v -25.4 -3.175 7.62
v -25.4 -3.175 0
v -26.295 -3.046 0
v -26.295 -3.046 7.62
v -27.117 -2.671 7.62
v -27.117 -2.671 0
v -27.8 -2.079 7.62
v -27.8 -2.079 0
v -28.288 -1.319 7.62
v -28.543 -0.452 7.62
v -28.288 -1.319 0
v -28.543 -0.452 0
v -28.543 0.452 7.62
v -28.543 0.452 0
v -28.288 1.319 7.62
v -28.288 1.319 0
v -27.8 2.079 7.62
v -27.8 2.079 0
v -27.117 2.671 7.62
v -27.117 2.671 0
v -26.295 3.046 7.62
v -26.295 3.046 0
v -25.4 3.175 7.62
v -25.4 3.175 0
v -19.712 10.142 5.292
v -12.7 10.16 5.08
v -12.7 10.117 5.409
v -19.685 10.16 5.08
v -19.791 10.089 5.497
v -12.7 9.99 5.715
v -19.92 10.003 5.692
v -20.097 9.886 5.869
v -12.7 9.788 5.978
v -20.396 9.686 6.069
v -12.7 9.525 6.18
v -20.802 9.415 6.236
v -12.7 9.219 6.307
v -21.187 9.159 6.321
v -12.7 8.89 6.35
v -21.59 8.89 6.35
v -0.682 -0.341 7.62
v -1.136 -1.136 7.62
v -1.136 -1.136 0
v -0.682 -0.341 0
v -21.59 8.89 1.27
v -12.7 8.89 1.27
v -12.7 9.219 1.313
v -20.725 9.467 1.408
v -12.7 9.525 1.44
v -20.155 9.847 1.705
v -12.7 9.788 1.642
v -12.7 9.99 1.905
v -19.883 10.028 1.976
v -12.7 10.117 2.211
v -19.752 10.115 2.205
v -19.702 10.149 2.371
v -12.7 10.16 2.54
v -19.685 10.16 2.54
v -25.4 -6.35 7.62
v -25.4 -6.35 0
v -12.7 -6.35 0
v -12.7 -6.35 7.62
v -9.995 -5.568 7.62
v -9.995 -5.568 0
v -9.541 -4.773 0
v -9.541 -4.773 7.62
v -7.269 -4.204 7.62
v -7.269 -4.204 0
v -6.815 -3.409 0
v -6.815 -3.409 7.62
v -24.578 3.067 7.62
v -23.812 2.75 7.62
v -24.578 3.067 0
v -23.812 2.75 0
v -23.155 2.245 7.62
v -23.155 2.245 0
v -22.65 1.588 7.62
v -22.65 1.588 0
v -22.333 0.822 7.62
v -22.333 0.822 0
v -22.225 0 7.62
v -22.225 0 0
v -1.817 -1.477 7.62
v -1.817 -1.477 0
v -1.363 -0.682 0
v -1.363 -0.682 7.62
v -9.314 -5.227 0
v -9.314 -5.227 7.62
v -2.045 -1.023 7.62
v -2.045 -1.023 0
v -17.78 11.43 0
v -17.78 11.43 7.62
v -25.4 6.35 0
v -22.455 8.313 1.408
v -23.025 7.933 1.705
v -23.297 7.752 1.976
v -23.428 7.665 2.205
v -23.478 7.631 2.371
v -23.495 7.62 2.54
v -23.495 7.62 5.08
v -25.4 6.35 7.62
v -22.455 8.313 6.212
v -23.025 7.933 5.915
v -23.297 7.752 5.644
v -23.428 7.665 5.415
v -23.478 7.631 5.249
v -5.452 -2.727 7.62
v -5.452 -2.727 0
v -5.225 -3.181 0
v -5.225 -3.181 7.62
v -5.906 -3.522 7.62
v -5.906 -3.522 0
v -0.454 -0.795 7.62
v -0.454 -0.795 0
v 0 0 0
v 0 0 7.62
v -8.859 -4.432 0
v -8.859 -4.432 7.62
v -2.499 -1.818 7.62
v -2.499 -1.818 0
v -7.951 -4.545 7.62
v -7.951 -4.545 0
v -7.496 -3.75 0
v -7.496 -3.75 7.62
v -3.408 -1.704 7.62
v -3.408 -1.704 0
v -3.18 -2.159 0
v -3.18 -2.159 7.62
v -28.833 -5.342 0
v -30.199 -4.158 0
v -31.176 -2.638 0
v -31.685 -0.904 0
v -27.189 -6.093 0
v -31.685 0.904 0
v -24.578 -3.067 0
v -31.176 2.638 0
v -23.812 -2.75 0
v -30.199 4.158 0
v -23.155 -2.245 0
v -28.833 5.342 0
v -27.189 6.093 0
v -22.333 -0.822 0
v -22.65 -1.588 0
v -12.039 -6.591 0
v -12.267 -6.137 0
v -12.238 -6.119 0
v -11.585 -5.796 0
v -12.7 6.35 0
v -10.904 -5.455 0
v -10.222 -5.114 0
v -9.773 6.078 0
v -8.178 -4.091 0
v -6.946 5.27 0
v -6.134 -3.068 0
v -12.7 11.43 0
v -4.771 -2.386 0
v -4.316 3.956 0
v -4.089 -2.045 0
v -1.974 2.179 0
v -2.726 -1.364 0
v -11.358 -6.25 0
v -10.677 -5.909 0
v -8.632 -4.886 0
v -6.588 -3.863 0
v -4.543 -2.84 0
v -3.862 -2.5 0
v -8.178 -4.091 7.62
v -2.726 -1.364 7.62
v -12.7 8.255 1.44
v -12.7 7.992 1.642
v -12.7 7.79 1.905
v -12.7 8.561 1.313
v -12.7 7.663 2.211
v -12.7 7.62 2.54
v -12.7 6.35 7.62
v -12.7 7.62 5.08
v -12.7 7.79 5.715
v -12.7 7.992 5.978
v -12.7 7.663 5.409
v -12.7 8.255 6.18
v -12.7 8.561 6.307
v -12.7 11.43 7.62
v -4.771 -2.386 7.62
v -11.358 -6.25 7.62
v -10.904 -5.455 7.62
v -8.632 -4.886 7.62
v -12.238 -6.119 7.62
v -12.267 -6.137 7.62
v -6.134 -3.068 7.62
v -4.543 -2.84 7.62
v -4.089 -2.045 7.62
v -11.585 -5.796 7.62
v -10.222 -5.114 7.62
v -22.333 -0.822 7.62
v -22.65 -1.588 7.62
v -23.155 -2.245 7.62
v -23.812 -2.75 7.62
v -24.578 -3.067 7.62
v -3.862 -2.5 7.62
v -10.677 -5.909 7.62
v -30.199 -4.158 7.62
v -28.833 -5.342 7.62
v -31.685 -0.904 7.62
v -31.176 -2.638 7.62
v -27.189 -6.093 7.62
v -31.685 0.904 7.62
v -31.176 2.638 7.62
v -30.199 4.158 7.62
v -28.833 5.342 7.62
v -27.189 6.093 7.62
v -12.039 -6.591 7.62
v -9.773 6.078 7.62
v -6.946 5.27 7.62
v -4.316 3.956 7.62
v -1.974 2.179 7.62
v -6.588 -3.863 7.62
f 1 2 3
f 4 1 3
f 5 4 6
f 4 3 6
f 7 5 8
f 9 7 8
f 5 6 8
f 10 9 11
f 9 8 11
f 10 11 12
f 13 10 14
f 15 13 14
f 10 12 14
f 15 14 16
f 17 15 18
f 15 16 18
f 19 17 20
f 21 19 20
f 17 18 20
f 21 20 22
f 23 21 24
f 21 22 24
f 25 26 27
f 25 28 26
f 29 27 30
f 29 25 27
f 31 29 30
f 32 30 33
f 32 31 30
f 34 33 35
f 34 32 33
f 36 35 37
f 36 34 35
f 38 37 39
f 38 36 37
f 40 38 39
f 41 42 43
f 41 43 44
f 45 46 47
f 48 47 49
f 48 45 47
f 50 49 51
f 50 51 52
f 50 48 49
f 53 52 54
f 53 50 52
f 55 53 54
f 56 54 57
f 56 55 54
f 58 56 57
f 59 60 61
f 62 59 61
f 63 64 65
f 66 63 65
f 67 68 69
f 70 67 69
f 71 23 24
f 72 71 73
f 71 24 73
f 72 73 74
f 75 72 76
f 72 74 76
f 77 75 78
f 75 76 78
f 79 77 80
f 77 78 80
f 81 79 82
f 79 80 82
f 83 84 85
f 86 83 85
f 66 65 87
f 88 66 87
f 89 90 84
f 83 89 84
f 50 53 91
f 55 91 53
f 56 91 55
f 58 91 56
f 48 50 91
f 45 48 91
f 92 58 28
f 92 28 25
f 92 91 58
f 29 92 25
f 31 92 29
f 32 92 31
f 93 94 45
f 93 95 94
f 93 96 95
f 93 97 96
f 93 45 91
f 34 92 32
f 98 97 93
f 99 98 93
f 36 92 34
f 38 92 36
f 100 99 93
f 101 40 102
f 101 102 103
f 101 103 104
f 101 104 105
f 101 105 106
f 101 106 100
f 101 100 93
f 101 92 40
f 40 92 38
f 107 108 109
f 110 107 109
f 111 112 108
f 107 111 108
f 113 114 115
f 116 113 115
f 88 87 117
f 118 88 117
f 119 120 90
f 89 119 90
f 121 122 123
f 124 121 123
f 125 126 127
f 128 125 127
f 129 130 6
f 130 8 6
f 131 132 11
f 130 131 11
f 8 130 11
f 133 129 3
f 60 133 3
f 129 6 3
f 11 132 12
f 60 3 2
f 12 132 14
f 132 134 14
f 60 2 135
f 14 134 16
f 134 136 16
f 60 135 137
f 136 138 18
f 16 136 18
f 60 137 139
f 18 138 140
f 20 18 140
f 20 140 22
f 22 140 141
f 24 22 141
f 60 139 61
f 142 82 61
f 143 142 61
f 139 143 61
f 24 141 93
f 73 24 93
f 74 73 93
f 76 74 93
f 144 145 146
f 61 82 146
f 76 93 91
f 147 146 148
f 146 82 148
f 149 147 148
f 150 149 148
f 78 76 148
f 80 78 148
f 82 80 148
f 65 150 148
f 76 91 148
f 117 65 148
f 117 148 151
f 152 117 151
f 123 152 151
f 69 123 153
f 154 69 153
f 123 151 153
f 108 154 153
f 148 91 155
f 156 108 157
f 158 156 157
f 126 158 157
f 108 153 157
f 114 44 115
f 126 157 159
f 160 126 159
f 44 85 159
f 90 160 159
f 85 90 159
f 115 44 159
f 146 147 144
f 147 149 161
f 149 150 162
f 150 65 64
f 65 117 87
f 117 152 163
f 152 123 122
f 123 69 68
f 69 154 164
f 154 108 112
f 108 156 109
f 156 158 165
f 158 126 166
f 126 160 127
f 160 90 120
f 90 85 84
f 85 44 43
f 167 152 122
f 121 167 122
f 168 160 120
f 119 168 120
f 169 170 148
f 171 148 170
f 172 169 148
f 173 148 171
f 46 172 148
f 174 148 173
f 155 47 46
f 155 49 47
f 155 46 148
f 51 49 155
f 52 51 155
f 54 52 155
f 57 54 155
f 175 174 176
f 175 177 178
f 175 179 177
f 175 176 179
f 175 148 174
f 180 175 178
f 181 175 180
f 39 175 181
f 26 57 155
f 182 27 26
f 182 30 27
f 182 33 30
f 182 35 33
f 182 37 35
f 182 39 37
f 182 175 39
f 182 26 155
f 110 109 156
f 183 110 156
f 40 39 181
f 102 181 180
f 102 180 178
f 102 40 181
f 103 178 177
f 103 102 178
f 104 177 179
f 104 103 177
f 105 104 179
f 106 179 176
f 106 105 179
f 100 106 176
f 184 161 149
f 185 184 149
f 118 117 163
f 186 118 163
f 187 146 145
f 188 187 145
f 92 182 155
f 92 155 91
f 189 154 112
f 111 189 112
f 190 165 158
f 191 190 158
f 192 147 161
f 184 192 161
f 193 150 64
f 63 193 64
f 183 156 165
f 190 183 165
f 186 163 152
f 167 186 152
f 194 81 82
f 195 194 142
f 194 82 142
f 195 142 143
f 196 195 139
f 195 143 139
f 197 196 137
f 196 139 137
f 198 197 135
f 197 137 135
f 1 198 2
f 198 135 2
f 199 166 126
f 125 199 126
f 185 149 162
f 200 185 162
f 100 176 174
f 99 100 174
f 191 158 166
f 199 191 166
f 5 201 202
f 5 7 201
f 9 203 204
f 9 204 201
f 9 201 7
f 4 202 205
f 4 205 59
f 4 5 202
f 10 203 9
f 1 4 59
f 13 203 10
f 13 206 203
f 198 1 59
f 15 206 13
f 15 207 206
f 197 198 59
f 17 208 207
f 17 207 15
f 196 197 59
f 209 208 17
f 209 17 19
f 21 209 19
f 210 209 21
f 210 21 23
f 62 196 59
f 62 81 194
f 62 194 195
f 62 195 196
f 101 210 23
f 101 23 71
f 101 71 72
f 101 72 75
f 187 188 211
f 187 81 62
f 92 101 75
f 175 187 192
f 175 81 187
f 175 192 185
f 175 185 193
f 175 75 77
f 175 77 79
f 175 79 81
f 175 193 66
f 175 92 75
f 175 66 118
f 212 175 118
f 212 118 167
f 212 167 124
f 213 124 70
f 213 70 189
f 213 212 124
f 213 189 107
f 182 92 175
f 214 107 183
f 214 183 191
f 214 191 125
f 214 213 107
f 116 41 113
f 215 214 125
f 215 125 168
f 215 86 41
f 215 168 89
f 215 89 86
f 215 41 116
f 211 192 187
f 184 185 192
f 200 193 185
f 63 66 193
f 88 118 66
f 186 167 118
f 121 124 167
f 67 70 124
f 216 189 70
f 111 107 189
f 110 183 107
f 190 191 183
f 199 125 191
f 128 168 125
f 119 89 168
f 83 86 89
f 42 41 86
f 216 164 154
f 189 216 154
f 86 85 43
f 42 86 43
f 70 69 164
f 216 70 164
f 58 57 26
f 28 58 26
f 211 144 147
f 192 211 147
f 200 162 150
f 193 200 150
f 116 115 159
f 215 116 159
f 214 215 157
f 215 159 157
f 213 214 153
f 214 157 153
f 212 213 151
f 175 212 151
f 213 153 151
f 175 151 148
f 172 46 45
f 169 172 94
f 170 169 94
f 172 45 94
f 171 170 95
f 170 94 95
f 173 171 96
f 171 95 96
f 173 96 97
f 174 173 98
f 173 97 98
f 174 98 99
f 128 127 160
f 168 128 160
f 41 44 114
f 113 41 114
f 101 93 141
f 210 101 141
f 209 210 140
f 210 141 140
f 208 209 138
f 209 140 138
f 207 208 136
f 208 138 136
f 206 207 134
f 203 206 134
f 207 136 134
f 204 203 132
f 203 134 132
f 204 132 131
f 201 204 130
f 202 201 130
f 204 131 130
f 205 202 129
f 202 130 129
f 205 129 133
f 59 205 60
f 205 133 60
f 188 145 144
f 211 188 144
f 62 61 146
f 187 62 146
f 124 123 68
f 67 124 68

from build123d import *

# Parameters (mm, degrees)
F1_DEPTH = 7.62
F3_DEPTH = 7.62
F4_W     = 2.54
F4_H     = 2.54
F5_DEPTH = 25.4
F6_R     = 1.26999


# Not quite as in the source:
# - a fillet or chamfer is up to 0.001 mm smaller than in the source, because OpenCascade refuses the exact size


with BuildPart() as f1:
    # F0 (on Top) → F1 (new body)
    with BuildSketch(Plane.XY):
        with BuildLine():
            Line((-12.7, -6.35), (-12.7, 0))
            Line((-12.7, 0), (-19.05, 0))
            ThreePointArc((-19.05, 0), (-20.9098719395, -4.4901280605), (-25.4, -6.35))
            Line((-25.4, -6.35), (-12.7, -6.35))
        make_face()
        with BuildLine():
            Line((-12.7, 6.35), (-12.7, 0))
            Line((-12.7, 0), (-2.2980148465, 0))
            Line((-2.2980148465, 0), (-1.3816523133, 0.5641126772))
            Line((-1.3816523133, 0.5641126772), (0, 0))
            ThreePointArc((0, 0), (-5.6004841714, 4.6740316571), (-12.7, 6.35))
        make_face()
        with BuildLine():
            Line((-19.05, 0), (-12.7, 0))
            Line((-12.7, 0), (-12.7, 6.35))
            Line((-12.7, 6.35), (-25.4, 6.35))
            ThreePointArc((-25.4, 6.35), (-20.9098719395, 4.4901280605), (-19.05, 0))
        make_face()
        Polygon((-2.2980148465, 0), (-12.7, 0), (-12.7, -6.35), (-12.2375346417, -6.1187673209), align=None)
        with BuildLine():
            ThreePointArc((-25.4, -6.35), (-20.9098719395, -4.4901280605), (-19.05, 0))
            Line((-19.05, 0), (-22.225, 0))
            ThreePointArc((-22.225, 0), (-23.1549359697, -2.2450640303), (-25.4, -3.175))
            Line((-25.4, -3.175), (-25.4, -6.35))
        make_face()
        with BuildLine():
            Line((-22.225, 0), (-19.05, 0))
            ThreePointArc((-19.05, 0), (-20.9098719395, 4.4901280605), (-25.4, 6.35))
            Line((-25.4, 6.35), (-25.4, 3.175))
            ThreePointArc((-25.4, 3.175), (-23.1549359697, 2.2450640303), (-22.225, 0))
        make_face()
        Polygon((-1.3816523133, 0.5641126772), (-2.2980148465, 0), (0, 0), align=None)
        Polygon((0, 0), (-2.2980148465, 0), (-12.2375346417, -6.1187673209), (-0.6815535195, -0.3407767598), align=None)
        with BuildLine():
            Line((-25.4, 3.175), (-25.4, 6.35))
            ThreePointArc((-25.4, 6.35), (-31.75, 0), (-25.4, -6.35))
            Line((-25.4, -6.35), (-25.4, -3.175))
            ThreePointArc((-25.4, -3.175), (-28.575, 0), (-25.4, 3.175))
        make_face()
        Polygon((-0.454369013, -0.7951457728), (0, 0), (-0.6815535195, -0.3407767598), (-0.6815020435, -0.3408797119), align=None)
        Polygon((-0.6815535195, -0.3407767598), (-12.2375346417, -6.1187673209), (-12.2666181754, -6.1366711411), (-11.5850646558, -5.7958943813), (-11.3579903771, -6.2500430279), (-10.903621364, -5.4548972551), (-10.6765470852, -5.9090459018), (-10.2221780722, -5.113900129), (-9.9951037934, -5.5680487756), (-9.5407347804, -4.7729030028), (-9.3136605016, -5.2270516495), (-8.8592914886, -4.4319058767), (-8.6322172098, -4.8860545233), (-8.1778481968, -4.0909087505), (-7.950773918, -4.5450573971), (-7.496404905, -3.7499116243), (-7.2693306262, -4.204060271), (-6.8149616132, -3.4089144982), (-6.5878873344, -3.8630631448), (-6.1335183214, -3.067917372), (-5.9063852987, -3.5221834368), (-5.4520162857, -2.727037664), (-5.224883263, -3.1813037288), (-4.7705142499, -2.386157956), (-4.5433812273, -2.8404240208), (-4.0890122142, -2.045278248), (-3.8618791916, -2.4995443128), (-3.4075101785, -1.70439854), (-3.1803771559, -2.1586646048), (-2.7260081428, -1.363518832), (-2.4988751201, -1.8177848968), (-2.0445061071, -1.022639124), (-1.8173730844, -1.4769051888), (-1.3630040714, -0.681759416), (-1.1358710487, -1.1360254808), (-0.6815020357, -0.340879708), align=None)
        Polygon((-11.5850646558, -5.7958943813), (-12.2666181754, -6.1366711411), (-12.0394336689, -6.5910401541), align=None)
    extrude(amount=F1_DEPTH)

    # F2 (on face) → F3 (join)
    with BuildSketch(Plane.XY.offset(7.62)):
        Polygon((-25.4, 6.35), (-12.7, 6.35), (-12.7, 11.43), (-17.78, 11.43), align=None)
    extrude(amount=-F3_DEPTH)

    # F4 (on face) → F5 (cut)
    with BuildSketch(Plane.YZ.offset(-12.7)):
        with Locations((8.89, 2.54)):
            Rectangle(F4_W, F4_H)
        with Locations((8.89, 5.08)):
            Rectangle(F4_W, F4_H)
    extrude(amount=-F5_DEPTH, mode=Mode.SUBTRACT)

    # F6 (radius 1.27 in the source; OpenCascade refuses exactly that, so slightly less here)
    f6_edges = [f1.edges().sort_by_distance(p)[0] for p in [
        (-18.0975, 7.62, 1.27),
        (-18.0975, 7.62, 6.35),
        (-16.1925, 10.16, 6.35),
        (-16.1925, 10.16, 1.27),
    ]]
    fillet(f6_edges, radius=F6_R)


solid = f1.part
